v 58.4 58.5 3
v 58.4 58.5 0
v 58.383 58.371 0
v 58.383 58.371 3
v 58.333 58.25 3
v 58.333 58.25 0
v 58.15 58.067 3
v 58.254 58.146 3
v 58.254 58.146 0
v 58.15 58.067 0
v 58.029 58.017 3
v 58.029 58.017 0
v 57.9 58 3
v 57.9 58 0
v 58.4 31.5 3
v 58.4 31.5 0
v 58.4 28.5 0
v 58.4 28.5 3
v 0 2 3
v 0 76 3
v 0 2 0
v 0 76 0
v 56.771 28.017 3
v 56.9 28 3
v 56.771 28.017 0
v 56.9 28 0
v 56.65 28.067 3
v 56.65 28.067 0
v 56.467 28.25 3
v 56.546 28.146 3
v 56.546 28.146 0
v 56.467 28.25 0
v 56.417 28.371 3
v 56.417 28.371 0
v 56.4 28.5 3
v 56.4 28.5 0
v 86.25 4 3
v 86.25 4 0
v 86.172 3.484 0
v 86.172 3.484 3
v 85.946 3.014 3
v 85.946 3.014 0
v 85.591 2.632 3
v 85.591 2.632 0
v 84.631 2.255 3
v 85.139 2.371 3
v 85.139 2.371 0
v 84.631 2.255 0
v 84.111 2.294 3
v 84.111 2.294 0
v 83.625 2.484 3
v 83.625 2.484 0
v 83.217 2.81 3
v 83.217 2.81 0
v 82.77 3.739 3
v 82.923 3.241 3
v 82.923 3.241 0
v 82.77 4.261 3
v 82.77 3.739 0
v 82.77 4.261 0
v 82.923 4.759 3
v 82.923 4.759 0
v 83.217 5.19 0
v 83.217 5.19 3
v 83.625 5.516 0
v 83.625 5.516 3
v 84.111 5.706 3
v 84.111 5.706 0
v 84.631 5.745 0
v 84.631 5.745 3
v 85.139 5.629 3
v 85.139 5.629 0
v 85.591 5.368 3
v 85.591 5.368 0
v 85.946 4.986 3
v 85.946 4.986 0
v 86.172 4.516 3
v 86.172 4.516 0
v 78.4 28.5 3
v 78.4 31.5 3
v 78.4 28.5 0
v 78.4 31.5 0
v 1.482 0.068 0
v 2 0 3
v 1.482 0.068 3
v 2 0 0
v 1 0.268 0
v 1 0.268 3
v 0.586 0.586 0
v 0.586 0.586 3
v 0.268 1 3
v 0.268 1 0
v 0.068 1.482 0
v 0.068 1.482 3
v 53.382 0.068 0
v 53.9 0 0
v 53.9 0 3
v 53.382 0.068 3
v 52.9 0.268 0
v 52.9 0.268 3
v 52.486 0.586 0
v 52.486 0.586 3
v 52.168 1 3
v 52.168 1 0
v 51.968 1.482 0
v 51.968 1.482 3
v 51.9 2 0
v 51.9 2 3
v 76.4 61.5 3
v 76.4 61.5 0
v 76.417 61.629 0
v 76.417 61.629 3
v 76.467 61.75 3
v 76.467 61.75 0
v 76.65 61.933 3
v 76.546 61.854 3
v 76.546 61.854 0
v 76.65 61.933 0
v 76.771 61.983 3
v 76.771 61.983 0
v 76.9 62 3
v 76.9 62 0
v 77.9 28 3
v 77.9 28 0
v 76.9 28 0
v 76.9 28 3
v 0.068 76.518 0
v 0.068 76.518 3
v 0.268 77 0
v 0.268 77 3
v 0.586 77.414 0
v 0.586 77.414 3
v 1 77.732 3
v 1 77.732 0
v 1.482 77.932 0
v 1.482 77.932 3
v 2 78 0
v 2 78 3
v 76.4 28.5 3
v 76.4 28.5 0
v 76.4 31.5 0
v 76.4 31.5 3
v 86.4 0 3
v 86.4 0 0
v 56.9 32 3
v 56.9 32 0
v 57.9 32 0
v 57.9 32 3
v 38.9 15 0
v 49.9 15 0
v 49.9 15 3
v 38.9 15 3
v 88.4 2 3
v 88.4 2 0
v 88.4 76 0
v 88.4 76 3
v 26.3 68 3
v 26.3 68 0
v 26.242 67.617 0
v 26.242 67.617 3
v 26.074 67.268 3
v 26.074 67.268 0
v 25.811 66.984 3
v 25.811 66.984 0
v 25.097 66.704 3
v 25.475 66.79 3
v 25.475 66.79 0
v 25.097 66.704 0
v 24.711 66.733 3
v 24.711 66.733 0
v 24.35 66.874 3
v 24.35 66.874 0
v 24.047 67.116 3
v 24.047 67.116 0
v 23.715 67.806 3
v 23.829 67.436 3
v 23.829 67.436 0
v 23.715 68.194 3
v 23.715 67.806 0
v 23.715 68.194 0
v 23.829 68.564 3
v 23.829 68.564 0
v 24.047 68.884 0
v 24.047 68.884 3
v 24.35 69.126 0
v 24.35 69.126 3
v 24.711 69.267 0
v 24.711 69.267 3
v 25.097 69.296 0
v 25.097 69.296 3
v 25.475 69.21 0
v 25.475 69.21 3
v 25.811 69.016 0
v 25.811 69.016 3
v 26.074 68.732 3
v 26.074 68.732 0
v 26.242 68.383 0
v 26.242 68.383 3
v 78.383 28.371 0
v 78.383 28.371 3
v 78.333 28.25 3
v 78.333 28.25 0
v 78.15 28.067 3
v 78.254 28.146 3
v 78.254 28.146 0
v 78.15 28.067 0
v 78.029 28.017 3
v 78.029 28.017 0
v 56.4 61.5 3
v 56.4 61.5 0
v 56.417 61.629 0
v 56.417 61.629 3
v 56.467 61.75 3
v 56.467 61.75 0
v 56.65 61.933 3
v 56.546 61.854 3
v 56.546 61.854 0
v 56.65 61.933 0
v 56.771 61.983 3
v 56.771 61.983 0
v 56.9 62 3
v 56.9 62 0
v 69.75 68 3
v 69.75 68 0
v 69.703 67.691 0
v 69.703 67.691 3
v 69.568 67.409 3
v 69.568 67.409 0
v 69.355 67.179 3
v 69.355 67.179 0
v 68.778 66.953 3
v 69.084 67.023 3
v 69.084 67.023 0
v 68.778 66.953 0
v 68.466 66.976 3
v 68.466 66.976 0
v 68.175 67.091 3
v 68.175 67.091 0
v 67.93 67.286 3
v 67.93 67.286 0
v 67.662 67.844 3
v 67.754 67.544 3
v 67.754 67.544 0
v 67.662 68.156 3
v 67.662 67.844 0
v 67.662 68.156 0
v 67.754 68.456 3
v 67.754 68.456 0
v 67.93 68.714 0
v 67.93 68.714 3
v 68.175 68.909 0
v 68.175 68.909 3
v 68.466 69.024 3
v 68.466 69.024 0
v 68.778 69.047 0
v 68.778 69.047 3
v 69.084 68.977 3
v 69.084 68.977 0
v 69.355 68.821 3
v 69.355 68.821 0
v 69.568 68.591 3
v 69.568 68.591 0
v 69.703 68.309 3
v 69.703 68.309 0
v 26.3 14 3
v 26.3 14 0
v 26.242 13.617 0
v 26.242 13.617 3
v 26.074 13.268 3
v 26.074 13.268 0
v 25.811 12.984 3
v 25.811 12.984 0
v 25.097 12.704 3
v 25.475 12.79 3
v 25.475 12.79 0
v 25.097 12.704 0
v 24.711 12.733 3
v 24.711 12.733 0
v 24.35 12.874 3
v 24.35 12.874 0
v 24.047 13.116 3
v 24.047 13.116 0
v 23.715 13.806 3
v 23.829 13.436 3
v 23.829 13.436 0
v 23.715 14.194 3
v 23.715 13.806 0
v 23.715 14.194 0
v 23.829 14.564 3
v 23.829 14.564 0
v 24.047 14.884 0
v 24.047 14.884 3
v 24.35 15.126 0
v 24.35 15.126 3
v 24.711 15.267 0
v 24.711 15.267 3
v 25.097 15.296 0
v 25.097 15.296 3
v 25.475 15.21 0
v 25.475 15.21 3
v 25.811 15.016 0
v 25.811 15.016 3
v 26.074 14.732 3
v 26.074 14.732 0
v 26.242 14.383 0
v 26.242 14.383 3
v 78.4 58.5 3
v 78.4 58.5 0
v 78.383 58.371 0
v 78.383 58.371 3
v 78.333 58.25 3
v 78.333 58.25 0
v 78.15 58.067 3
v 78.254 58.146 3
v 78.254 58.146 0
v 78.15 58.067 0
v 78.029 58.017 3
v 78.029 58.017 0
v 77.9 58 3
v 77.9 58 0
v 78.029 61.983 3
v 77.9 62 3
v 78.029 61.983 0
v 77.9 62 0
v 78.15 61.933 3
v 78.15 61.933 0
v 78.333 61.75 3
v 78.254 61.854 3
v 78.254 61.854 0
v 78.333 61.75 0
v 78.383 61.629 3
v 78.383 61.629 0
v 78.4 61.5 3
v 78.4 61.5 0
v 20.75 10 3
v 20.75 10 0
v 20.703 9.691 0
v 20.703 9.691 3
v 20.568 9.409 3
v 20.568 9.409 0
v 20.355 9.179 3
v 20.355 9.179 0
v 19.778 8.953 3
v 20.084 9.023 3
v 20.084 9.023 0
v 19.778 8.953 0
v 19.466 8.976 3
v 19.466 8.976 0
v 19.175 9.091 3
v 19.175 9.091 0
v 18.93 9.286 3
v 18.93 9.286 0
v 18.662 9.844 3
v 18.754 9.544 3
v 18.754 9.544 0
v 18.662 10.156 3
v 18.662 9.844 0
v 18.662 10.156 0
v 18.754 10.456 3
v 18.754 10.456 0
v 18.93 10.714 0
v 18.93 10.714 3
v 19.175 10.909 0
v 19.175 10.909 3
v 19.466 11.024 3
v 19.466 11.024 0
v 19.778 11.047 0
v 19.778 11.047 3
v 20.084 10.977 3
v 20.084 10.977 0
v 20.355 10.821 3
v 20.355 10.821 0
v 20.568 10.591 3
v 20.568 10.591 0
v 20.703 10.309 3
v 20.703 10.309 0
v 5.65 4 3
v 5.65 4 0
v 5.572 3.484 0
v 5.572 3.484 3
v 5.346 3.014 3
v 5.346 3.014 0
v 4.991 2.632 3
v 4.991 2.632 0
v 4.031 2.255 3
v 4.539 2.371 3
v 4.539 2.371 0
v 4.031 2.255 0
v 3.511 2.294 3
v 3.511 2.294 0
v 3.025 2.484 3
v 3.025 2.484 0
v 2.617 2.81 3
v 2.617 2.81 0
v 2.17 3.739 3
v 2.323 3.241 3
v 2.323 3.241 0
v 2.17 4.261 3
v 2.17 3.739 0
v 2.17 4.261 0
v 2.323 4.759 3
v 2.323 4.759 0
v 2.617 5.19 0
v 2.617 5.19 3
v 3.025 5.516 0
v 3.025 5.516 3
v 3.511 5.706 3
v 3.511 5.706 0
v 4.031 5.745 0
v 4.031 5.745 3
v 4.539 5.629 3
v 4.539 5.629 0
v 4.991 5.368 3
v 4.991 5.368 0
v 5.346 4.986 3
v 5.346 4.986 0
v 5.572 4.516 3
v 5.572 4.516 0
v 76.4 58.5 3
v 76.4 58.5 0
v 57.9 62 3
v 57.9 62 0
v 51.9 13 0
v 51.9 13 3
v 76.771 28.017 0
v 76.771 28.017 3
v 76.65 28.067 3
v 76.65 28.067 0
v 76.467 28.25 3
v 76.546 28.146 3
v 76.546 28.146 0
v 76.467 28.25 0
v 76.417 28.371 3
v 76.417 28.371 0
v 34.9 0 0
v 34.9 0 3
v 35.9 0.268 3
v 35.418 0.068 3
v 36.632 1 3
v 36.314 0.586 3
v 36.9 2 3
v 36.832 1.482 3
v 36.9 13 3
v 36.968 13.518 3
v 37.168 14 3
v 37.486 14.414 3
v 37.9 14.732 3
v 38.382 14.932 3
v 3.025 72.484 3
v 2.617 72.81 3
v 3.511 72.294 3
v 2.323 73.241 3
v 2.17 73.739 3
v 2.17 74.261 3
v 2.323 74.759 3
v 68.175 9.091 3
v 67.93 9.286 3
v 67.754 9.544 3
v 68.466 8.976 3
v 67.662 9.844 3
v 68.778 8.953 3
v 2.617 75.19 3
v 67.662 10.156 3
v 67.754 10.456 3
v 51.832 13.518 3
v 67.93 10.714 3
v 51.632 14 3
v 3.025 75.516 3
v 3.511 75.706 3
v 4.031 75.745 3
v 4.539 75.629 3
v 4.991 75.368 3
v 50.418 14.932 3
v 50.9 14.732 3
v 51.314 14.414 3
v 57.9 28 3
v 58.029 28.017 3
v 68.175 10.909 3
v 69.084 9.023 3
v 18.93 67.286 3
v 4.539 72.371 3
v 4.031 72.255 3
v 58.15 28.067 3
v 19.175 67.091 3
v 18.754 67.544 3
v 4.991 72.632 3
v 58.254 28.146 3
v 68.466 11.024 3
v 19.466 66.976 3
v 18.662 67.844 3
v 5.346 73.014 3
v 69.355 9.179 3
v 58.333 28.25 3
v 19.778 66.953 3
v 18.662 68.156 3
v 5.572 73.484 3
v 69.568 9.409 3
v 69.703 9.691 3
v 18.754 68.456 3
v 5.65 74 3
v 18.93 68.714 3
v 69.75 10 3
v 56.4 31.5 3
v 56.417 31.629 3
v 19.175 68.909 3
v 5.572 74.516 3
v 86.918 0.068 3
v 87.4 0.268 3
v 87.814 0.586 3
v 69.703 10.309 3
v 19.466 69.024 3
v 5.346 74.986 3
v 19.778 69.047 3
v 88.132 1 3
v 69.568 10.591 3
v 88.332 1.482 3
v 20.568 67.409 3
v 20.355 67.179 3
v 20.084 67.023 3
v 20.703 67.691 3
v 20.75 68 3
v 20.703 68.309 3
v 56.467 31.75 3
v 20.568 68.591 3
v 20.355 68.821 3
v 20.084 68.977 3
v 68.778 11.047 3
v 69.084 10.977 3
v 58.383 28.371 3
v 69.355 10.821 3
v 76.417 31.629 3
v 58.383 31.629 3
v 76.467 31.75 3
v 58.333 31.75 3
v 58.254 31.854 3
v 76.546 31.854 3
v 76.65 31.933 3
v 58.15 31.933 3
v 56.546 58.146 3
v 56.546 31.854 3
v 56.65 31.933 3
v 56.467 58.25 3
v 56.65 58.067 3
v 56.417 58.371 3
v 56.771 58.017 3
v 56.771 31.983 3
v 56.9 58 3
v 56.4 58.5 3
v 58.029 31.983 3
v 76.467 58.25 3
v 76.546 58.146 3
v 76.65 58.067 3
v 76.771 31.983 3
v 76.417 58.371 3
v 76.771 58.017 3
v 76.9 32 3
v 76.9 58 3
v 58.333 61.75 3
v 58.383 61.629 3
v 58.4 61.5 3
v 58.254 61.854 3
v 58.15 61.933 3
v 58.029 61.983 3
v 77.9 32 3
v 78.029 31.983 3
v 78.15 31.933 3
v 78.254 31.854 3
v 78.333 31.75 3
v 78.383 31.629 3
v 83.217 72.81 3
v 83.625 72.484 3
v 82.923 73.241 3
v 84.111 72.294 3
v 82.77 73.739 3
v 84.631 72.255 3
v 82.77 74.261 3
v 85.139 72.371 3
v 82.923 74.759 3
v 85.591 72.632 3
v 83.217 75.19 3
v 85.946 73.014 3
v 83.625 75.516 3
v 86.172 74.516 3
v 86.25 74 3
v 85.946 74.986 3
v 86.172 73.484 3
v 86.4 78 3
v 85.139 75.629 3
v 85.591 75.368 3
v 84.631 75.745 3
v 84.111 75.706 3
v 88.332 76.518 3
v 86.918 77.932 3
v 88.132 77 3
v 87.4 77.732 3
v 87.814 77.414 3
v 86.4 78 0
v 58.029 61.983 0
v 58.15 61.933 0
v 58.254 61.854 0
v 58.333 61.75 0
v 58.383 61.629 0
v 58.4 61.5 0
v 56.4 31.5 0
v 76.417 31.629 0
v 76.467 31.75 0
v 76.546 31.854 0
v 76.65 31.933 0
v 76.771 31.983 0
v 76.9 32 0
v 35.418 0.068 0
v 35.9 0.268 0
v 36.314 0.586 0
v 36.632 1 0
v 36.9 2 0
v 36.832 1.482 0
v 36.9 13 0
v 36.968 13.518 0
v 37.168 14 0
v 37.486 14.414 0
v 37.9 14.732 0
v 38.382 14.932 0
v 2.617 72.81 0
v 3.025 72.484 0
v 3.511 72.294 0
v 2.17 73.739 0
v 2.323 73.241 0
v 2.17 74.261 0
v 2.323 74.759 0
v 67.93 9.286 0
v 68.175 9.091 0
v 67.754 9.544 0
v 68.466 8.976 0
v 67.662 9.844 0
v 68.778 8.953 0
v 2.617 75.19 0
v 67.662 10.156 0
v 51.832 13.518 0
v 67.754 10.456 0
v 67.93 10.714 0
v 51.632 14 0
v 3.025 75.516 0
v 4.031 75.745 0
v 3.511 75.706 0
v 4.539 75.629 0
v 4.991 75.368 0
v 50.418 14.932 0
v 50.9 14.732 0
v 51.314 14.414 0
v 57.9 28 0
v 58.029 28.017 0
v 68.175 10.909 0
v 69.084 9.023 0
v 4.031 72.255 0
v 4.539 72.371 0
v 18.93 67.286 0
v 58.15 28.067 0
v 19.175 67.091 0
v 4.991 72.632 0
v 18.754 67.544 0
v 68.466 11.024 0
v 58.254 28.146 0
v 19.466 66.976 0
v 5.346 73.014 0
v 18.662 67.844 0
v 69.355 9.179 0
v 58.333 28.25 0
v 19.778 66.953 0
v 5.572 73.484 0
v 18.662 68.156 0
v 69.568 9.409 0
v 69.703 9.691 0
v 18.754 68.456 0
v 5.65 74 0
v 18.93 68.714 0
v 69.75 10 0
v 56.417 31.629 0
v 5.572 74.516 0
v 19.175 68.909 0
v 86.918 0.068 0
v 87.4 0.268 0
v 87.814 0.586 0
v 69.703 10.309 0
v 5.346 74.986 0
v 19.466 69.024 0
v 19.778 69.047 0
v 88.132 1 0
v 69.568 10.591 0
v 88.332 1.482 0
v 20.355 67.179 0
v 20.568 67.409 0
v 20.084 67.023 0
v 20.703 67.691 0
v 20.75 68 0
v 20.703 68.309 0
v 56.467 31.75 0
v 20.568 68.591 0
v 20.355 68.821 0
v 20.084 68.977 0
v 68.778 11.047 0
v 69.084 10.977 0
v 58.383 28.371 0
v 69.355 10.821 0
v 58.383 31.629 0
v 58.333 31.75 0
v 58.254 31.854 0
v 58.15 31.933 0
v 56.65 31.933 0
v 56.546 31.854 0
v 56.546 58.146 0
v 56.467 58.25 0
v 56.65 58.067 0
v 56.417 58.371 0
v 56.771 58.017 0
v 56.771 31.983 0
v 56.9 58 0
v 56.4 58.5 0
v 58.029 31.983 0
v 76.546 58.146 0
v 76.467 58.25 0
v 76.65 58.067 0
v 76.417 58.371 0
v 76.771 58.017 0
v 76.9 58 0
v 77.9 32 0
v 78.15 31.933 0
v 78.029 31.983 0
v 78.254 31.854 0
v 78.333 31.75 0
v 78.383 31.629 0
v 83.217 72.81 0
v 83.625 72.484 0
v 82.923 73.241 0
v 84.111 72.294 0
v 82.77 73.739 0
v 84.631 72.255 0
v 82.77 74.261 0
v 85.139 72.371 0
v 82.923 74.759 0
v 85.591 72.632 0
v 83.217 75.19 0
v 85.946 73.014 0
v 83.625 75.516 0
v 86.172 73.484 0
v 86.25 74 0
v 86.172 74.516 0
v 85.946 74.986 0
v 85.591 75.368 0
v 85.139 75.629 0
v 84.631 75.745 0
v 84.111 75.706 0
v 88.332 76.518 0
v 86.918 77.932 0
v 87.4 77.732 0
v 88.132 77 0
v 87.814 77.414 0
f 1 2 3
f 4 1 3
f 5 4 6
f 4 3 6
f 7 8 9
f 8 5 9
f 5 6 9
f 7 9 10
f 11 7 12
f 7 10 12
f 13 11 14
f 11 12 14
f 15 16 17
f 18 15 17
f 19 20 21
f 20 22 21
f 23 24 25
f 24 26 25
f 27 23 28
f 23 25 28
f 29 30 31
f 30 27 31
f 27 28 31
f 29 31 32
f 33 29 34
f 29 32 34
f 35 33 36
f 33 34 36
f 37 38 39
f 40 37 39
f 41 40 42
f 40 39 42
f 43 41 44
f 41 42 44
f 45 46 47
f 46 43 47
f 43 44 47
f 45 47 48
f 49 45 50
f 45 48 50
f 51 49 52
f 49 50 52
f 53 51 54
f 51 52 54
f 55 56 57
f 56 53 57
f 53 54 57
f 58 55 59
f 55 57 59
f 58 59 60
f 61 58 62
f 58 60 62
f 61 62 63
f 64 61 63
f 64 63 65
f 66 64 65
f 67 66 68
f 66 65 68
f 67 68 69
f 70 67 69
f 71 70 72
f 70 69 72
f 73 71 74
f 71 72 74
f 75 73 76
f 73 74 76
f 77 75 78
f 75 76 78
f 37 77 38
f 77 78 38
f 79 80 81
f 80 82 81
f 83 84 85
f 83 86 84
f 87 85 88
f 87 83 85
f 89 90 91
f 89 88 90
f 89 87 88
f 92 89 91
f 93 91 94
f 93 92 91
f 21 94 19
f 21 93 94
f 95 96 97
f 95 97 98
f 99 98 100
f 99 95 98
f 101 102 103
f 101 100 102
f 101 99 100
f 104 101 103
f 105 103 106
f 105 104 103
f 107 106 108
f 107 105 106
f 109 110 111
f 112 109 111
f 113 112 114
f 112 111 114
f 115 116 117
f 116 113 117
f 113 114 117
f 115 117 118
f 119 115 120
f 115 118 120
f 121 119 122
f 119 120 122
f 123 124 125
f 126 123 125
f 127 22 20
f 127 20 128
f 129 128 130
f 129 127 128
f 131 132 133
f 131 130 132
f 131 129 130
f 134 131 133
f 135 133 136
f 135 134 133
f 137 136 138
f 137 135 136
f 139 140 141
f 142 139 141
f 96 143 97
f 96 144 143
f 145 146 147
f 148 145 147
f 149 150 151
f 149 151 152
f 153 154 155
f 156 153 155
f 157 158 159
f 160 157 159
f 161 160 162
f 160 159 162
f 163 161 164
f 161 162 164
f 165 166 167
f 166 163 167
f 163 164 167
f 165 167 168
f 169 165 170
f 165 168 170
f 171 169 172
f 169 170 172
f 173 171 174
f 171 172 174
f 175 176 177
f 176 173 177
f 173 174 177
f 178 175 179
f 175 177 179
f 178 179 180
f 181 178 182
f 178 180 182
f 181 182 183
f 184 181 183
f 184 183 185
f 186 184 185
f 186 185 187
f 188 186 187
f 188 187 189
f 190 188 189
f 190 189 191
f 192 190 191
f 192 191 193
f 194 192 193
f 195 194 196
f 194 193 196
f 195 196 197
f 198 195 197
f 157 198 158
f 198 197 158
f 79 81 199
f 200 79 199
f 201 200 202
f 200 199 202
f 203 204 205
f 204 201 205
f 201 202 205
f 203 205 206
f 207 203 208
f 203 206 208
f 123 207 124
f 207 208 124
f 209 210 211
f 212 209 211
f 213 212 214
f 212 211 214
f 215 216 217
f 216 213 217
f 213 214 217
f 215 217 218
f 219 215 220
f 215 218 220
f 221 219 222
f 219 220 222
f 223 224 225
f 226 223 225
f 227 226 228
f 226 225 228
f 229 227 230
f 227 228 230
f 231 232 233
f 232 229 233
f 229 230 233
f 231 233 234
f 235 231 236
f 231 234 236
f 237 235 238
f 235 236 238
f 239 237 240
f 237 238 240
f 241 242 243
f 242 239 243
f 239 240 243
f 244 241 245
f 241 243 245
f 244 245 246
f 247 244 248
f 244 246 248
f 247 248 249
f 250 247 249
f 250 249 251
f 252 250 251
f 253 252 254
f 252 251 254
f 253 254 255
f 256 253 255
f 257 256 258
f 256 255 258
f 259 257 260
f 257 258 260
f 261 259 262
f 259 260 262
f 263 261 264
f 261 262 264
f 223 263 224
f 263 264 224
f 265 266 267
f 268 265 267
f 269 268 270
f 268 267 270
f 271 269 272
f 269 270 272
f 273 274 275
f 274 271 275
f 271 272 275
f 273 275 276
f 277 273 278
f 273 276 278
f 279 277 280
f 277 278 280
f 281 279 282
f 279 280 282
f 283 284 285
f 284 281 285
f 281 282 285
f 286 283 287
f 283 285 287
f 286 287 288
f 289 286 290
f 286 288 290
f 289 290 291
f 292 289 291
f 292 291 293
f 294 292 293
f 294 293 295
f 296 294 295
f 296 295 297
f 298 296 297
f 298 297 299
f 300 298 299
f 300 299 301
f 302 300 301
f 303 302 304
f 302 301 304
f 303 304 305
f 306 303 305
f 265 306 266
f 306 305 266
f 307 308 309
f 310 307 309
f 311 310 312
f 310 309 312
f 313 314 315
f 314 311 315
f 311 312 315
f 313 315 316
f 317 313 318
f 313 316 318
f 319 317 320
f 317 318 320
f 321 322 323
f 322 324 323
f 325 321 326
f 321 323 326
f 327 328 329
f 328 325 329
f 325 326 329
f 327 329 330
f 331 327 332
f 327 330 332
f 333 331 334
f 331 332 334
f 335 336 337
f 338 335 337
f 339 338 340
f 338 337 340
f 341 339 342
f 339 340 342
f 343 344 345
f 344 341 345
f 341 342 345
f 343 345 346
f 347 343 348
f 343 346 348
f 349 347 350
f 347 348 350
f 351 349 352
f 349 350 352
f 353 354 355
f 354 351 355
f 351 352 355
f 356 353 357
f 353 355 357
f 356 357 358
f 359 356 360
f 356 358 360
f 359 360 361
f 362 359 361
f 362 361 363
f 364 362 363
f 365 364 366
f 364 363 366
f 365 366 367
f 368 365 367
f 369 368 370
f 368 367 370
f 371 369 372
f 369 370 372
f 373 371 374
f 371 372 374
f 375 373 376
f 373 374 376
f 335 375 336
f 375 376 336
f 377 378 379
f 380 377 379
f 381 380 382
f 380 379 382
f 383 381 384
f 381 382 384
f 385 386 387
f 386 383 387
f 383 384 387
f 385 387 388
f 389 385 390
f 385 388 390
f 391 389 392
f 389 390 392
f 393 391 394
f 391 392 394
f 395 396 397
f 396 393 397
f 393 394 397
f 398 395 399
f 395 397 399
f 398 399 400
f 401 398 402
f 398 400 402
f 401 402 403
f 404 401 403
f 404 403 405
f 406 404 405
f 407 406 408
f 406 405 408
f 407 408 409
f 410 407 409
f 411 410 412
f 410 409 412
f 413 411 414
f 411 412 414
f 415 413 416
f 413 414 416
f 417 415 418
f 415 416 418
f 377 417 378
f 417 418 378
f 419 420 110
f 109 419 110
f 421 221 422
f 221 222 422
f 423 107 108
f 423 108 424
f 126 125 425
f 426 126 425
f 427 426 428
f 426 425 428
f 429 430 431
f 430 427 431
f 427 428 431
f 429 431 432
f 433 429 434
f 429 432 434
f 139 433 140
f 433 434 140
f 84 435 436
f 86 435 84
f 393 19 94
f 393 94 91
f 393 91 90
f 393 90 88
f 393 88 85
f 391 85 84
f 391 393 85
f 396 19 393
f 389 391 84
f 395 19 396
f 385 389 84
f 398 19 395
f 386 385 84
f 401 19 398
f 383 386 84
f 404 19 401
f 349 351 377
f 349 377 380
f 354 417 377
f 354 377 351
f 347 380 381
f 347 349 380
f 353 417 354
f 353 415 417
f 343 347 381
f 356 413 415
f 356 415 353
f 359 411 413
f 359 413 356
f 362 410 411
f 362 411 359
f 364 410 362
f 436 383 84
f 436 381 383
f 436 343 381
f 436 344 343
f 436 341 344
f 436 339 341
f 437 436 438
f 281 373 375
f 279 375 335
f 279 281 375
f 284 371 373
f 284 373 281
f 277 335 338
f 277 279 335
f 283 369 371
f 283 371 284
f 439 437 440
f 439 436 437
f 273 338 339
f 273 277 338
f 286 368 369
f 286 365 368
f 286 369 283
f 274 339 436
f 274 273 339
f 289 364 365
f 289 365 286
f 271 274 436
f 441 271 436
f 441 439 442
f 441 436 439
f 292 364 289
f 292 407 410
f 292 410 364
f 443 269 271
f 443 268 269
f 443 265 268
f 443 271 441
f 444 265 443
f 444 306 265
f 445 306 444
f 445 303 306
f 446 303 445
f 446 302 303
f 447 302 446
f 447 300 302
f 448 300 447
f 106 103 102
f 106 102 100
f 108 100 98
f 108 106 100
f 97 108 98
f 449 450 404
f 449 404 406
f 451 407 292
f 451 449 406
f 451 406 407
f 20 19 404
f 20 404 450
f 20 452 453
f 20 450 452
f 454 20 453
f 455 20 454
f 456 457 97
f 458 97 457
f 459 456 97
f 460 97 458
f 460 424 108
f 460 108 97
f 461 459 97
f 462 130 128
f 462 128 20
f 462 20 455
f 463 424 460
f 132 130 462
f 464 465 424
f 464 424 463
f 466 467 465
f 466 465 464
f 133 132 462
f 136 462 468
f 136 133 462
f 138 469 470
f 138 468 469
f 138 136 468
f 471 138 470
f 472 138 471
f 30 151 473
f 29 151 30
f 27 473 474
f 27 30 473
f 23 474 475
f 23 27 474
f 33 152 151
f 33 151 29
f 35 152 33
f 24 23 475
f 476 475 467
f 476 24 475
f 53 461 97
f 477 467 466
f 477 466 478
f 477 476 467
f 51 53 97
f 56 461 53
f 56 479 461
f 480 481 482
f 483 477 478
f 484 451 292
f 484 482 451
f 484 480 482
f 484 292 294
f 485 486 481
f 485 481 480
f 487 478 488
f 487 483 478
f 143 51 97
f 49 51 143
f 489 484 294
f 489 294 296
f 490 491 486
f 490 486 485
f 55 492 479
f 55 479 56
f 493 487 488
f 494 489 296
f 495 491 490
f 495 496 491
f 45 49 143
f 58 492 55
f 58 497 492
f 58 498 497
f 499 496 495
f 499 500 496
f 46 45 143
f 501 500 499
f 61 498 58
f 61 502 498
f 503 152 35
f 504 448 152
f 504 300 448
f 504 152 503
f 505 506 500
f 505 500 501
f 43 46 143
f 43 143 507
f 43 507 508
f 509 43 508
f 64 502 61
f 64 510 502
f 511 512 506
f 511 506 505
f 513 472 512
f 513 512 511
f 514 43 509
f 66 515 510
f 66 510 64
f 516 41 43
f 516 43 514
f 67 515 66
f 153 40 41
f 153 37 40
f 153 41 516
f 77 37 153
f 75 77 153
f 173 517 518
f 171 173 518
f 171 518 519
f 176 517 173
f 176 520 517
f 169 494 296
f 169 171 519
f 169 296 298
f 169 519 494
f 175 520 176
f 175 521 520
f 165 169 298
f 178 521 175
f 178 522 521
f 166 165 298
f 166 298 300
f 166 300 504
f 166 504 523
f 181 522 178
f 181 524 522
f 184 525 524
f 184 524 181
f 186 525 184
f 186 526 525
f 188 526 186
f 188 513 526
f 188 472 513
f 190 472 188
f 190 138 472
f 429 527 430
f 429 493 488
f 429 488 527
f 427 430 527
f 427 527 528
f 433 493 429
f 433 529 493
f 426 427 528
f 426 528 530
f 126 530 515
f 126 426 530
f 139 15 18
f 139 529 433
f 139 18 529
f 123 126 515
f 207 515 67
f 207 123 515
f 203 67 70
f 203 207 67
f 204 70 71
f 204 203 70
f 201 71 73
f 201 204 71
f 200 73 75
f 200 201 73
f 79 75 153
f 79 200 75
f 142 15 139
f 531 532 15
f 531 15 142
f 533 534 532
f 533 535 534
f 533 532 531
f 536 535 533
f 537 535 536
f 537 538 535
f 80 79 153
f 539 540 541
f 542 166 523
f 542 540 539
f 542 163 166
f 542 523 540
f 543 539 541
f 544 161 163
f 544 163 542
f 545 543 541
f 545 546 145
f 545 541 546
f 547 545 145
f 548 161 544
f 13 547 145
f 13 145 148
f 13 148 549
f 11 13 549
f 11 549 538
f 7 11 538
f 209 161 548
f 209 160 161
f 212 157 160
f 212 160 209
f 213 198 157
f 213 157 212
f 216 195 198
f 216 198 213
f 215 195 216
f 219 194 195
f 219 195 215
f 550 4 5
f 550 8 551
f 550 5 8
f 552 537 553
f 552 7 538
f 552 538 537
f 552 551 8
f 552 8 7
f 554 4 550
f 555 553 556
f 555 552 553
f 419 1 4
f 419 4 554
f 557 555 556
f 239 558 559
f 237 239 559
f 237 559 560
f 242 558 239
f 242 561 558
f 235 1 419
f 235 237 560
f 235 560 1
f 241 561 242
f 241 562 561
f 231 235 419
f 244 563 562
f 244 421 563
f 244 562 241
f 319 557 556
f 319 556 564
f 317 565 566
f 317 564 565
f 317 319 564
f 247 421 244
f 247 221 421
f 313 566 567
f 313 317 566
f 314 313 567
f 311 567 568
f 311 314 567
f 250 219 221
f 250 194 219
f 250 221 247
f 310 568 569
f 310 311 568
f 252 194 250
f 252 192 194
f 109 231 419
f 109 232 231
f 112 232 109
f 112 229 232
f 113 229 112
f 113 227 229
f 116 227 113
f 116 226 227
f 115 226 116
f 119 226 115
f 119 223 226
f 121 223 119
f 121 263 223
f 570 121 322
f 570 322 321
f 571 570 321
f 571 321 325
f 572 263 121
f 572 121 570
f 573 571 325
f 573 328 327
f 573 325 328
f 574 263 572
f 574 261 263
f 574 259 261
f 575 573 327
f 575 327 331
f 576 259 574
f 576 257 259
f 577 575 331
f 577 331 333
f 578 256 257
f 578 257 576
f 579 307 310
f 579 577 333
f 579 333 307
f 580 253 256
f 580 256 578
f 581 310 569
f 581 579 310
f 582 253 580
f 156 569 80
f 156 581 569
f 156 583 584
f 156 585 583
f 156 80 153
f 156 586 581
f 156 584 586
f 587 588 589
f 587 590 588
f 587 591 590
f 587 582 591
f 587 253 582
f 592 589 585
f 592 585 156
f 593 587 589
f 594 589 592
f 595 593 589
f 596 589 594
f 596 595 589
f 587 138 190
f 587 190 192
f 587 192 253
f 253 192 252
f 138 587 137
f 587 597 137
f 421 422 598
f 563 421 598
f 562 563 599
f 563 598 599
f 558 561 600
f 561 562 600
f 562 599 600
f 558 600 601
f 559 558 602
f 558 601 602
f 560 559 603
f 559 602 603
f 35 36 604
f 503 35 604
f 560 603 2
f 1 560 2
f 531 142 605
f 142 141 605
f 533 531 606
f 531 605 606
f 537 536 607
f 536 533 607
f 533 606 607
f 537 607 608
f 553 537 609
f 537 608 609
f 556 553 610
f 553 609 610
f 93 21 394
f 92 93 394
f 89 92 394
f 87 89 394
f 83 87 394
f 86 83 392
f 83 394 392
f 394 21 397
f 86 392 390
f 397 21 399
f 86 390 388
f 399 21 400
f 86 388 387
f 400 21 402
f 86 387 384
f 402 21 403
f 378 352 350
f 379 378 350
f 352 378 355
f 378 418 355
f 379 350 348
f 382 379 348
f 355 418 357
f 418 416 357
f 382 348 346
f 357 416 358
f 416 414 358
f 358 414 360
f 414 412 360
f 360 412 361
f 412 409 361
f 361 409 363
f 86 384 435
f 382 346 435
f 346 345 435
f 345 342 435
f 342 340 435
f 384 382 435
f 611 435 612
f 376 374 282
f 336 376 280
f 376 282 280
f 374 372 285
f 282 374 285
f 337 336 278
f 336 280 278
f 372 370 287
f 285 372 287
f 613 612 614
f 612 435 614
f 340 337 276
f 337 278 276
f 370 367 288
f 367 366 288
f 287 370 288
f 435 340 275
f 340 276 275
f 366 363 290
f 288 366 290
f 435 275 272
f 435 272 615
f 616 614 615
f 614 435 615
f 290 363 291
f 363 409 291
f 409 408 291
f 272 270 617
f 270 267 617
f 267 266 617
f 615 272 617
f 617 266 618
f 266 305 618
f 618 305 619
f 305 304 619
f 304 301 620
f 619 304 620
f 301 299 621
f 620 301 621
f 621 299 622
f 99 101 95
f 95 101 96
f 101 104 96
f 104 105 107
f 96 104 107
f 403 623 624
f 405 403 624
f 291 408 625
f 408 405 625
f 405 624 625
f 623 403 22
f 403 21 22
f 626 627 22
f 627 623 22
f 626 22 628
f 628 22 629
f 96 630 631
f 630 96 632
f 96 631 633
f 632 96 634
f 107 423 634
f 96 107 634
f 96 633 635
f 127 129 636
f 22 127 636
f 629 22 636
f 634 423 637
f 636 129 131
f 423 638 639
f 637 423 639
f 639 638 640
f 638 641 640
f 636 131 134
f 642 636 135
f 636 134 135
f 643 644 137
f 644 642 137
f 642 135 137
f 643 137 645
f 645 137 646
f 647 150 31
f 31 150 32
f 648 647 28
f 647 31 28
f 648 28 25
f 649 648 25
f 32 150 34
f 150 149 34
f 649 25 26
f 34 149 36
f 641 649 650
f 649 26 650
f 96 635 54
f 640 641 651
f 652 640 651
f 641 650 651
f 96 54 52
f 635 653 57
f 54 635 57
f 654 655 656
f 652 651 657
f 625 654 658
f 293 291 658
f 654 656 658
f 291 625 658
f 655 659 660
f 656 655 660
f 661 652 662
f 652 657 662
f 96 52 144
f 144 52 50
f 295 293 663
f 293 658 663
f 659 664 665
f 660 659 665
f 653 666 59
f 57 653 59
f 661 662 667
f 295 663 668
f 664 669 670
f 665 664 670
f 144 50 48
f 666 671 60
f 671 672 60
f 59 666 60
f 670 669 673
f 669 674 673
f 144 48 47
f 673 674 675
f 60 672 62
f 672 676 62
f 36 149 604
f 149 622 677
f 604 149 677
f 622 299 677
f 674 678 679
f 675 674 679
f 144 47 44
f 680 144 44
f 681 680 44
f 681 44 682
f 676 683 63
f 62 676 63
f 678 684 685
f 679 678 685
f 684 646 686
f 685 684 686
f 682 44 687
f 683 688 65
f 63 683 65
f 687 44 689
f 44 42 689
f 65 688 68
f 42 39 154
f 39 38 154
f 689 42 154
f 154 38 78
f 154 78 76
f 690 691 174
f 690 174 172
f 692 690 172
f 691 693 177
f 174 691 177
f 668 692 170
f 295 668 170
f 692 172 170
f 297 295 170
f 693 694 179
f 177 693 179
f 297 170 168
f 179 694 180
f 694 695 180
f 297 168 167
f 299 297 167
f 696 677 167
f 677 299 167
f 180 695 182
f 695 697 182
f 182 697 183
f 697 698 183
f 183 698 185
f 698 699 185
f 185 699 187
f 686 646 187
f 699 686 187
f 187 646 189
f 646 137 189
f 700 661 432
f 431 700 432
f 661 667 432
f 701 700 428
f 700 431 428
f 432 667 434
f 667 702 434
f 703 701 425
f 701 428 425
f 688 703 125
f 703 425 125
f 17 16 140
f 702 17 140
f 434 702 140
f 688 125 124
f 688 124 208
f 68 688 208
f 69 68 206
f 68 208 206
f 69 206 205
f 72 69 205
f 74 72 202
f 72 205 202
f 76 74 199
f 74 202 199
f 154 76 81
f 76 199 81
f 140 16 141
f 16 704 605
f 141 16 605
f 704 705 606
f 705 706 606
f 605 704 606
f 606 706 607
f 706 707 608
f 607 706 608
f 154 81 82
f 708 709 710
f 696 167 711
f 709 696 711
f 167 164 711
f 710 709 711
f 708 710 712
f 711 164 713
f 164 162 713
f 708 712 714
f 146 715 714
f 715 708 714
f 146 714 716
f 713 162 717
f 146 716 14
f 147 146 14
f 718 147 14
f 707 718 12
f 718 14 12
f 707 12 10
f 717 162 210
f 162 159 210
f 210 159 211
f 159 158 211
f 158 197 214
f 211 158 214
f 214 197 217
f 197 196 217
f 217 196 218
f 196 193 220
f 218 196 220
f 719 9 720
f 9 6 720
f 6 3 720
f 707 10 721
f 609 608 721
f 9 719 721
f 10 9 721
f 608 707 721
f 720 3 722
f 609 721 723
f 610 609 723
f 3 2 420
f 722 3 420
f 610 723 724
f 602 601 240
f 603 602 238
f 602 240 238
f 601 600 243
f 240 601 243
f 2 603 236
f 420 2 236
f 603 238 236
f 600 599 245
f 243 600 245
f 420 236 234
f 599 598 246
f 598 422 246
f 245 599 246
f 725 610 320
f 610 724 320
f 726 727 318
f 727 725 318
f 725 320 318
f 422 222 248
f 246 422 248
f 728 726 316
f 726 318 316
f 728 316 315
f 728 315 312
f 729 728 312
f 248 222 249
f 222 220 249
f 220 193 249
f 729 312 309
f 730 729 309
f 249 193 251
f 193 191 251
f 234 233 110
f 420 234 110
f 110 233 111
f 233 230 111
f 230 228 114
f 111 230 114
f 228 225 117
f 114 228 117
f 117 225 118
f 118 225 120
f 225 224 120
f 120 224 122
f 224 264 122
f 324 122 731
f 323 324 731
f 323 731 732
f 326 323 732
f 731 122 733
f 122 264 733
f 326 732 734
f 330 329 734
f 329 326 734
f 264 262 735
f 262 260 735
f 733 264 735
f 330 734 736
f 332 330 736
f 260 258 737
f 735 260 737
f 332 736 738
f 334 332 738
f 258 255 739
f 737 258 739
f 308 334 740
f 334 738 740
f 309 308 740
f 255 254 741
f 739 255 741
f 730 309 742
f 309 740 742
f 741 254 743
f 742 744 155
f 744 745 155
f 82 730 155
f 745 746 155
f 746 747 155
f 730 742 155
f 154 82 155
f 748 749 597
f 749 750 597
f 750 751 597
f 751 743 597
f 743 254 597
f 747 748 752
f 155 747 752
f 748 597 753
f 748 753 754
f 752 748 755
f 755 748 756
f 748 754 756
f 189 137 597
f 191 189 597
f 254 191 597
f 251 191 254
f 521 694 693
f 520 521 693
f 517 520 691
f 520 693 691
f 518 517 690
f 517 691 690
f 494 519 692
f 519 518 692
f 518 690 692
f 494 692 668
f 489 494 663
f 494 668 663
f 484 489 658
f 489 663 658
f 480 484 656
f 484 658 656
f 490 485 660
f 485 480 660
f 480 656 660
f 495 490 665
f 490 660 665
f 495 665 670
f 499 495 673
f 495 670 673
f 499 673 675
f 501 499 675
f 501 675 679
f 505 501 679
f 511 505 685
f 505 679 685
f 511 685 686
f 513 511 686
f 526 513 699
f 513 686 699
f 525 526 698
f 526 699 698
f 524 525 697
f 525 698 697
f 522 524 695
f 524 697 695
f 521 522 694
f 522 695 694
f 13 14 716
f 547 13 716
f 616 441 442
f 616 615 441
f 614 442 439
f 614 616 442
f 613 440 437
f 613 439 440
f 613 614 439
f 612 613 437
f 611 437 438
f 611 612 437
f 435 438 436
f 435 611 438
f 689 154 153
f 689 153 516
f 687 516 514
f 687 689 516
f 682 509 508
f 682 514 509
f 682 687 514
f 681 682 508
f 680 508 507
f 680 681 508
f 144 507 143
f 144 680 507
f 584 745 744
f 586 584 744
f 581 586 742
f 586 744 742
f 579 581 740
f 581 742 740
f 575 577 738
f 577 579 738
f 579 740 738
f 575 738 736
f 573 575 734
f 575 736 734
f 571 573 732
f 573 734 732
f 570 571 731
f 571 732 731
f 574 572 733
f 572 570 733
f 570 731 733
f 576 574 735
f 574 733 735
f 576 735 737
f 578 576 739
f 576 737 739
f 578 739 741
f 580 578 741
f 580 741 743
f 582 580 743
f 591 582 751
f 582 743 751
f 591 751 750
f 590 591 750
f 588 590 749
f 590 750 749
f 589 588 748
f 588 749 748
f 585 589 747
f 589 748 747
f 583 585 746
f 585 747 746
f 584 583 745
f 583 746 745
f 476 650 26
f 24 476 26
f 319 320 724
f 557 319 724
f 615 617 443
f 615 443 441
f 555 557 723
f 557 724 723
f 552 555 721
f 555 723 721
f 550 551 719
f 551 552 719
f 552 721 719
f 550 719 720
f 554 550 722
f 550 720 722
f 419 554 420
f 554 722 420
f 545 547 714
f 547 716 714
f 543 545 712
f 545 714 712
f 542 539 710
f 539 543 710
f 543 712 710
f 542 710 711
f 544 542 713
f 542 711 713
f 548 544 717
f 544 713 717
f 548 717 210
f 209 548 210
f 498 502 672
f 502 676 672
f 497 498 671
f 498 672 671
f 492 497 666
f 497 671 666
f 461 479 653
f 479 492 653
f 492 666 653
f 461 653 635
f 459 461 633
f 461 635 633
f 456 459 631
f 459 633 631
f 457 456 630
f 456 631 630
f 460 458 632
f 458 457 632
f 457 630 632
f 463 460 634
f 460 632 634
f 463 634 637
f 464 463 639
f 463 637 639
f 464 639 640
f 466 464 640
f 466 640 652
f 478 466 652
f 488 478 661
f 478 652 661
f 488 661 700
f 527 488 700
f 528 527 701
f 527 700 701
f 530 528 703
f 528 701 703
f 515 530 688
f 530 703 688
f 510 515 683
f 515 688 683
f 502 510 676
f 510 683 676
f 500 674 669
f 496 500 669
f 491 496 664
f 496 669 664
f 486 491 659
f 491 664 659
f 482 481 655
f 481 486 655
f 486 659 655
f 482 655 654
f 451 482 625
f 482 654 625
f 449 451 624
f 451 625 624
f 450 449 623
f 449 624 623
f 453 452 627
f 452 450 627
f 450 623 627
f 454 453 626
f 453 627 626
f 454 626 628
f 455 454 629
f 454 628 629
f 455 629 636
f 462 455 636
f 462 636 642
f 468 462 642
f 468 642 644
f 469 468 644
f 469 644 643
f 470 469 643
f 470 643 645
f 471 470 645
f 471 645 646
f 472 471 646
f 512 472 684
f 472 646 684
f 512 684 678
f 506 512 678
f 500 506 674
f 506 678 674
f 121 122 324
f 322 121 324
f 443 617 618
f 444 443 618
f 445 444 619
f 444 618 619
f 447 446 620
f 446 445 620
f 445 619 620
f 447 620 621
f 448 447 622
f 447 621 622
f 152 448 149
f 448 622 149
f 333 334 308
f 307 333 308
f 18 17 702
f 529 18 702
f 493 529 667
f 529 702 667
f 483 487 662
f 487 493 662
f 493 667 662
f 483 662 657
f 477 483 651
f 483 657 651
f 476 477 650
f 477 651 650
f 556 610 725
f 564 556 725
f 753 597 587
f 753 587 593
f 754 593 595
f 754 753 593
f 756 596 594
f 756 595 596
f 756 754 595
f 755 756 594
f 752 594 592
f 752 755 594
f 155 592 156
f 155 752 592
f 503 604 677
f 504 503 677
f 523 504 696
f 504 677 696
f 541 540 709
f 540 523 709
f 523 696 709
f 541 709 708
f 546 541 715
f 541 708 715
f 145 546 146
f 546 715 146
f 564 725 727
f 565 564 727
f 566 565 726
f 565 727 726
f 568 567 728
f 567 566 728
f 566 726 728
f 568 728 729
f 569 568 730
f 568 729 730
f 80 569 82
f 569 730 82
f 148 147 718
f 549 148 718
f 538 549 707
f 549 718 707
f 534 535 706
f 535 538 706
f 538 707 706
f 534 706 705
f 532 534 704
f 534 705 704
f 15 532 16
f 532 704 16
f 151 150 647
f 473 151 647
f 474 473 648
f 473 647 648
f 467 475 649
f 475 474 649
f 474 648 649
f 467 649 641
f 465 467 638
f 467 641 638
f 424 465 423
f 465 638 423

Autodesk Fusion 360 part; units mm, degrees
sketch "Esquisse1" plane through (0, 0, 0) normal (0, 0, 1) x (1, 0, 0)
  line L0 (88.4, 2) -> (88.4, 76)
  line L1 (86.4, 78) -> (2, 78)
  line L2 (0, 76) -> (0, 2)
  circle A0 centre (3.9, 4) radius 1.75
  circle A1 centre (3.9, 74) radius 1.75
  circle A2 centre (84.5, 74) radius 1.75
  circle A3 centre (84.5, 4) radius 1.75
  arc A4 (0, 2) -> (2, 0) centre (2, 2) ccw
  arc A5 (2, 78) -> (0, 76) centre (2, 76) ccw
  arc A6 (88.4, 76) -> (86.4, 78) centre (86.4, 76) ccw
  arc A7 (86.4, 0) -> (88.4, 2) centre (86.4, 2) ccw
  circle A8 centre (19.7, 10) radius 1.05
  circle A9 centre (68.7, 10) radius 1.05
  circle A10 centre (19.7, 68) radius 1.05
  circle A11 centre (68.7, 68) radius 1.05
  line L3 (51.9, 2) -> (51.9, 13)
  line L4 (49.9, 15) -> (38.9, 15)
  line L5 (36.9, 13) -> (36.9, 2)
  line L6 (34.9, 0) -> (2, 0)
  line L7 (86.4, 0) -> (53.9, 0)
  arc A12 (34.9, 0) -> (36.9, 2) centre (34.9, 2) ccw
  arc A13 (51.9, 2) -> (53.9, 0) centre (53.9, 2) ccw
  arc A14 (51.9, 13) -> (49.9, 15) centre (49.9, 13) ccw
  arc A15 (38.9, 15) -> (36.9, 13) centre (38.9, 13) ccw
  circle A16 centre (58.4, 28) radius 1.05
  circle A17 centre (25, 68) radius 1.3
  circle A18 centre (25, 14) radius 1.3
  line L8 (57.9, 28) -> (56.9, 28)
  line L9 (56.4, 28.5) -> (56.4, 31.5)
  line L10 (56.9, 32) -> (57.9, 32)
  line L11 (58.4, 31.5) -> (58.4, 28.5)
  arc A19 (56.4, 28.5) -> (56.9, 28) centre (56.9, 28.5) ccw
  arc A20 (56.9, 32) -> (56.4, 31.5) centre (56.9, 31.5) ccw
  arc A21 (58.4, 31.5) -> (57.9, 32) centre (57.9, 31.5) ccw
  arc A22 (57.9, 28) -> (58.4, 28.5) centre (57.9, 28.5) ccw
  line L12 (77.9, 28) -> (76.9, 28)
  arc A23 (77.9, 28) -> (78.4, 28.5) centre (77.9, 28.5) ccw
  line L13 (78.4, 31.5) -> (78.4, 28.5)
  line L14 (76.4, 28.5) -> (76.4, 31.5)
  arc A24 (76.4, 28.5) -> (76.9, 28) centre (76.9, 28.5) ccw
  line L15 (76.9, 32) -> (77.9, 32)
  arc A25 (78.4, 31.5) -> (77.9, 32) centre (77.9, 31.5) ccw
  arc A26 (76.9, 32) -> (76.4, 31.5) centre (76.9, 31.5) ccw
  line L16 (57.9, 58) -> (56.9, 58)
  arc A27 (57.9, 58) -> (58.4, 58.5) centre (57.9, 58.5) ccw
  line L17 (58.4, 61.5) -> (58.4, 58.5)
  line L18 (56.4, 58.5) -> (56.4, 61.5)
  arc A28 (56.4, 58.5) -> (56.9, 58) centre (56.9, 58.5) ccw
  line L19 (56.9, 62) -> (57.9, 62)
  arc A29 (58.4, 61.5) -> (57.9, 62) centre (57.9, 61.5) ccw
  arc A30 (56.9, 62) -> (56.4, 61.5) centre (56.9, 61.5) ccw
  line L20 (77.9, 58) -> (76.9, 58)
  arc A31 (77.9, 58) -> (78.4, 58.5) centre (77.9, 58.5) ccw
  line L21 (78.4, 61.5) -> (78.4, 58.5)
  line L22 (76.4, 58.5) -> (76.4, 61.5)
  arc A32 (76.4, 58.5) -> (76.9, 58) centre (76.9, 58.5) ccw
  line L23 (76.9, 62) -> (77.9, 62)
  arc A33 (78.4, 61.5) -> (77.9, 62) centre (77.9, 61.5) ccw
  arc A34 (76.9, 62) -> (76.4, 61.5) centre (76.9, 61.5) ccw
  point P0 (88.4, 0)
  point P1 (0, 78)
  point P2 (36.9, 0)
  point P3 (36.9, 15)
  point P4 (58.4, 28)
  point P5 (56.4, 28)
  point P6 (58.4, 32)
  dimension "d1" = 78
  dimension "d2" = 88.4
  dimension "d3" = 3.5
  dimension "d4" = 3.9
  dimension "d6" = 3.5
  dimension "d8" = 4
  dimension "d9" = 3.5
  dimension "d10" = 4
  dimension "d11" = 3.9
  dimension "d12" = 3.5
  dimension "d13" = 3.9
  dimension "d15" = 2
  dimension "d16" = 2
  dimension "d17" = 2
  dimension "d18" = 2
  dimension "d21" = 2.1
  dimension "d24" = 49
  dimension "d25" = 58
  dimension "d28" = 19.7
  dimension "d30" = 15
  dimension "d31" = 36.9
  dimension "d33" = 2
  dimension "d34" = 2
  dimension "d35" = 2
  dimension "d36" = 2
  dimension "d37" = 15
  dimension "d41" = 2.1
  dimension "d44" = 20
  dimension "d45" = 30
  dimension "d46" = 30
  dimension "d47" = 50
  dimension "d48" = 2.6
  dimension "d51" = 0
  dimension "d52" = -54
  dimension "d53" = 10
  dimension "d54" = 25
  dimension "d55" = 2
  dimension "d56" = 4
  dimension "d57" = 0.5
extrude "Extrusion1" add sketch "Esquisse1" along normal blind 3 contours L0 L1 L2 A4 A5 A6 A7 L3 L4 L5 L6 L7 A12 A13 A14 A15 | A16 L8 L11 A22 picked at (58.8173, 27.529)
